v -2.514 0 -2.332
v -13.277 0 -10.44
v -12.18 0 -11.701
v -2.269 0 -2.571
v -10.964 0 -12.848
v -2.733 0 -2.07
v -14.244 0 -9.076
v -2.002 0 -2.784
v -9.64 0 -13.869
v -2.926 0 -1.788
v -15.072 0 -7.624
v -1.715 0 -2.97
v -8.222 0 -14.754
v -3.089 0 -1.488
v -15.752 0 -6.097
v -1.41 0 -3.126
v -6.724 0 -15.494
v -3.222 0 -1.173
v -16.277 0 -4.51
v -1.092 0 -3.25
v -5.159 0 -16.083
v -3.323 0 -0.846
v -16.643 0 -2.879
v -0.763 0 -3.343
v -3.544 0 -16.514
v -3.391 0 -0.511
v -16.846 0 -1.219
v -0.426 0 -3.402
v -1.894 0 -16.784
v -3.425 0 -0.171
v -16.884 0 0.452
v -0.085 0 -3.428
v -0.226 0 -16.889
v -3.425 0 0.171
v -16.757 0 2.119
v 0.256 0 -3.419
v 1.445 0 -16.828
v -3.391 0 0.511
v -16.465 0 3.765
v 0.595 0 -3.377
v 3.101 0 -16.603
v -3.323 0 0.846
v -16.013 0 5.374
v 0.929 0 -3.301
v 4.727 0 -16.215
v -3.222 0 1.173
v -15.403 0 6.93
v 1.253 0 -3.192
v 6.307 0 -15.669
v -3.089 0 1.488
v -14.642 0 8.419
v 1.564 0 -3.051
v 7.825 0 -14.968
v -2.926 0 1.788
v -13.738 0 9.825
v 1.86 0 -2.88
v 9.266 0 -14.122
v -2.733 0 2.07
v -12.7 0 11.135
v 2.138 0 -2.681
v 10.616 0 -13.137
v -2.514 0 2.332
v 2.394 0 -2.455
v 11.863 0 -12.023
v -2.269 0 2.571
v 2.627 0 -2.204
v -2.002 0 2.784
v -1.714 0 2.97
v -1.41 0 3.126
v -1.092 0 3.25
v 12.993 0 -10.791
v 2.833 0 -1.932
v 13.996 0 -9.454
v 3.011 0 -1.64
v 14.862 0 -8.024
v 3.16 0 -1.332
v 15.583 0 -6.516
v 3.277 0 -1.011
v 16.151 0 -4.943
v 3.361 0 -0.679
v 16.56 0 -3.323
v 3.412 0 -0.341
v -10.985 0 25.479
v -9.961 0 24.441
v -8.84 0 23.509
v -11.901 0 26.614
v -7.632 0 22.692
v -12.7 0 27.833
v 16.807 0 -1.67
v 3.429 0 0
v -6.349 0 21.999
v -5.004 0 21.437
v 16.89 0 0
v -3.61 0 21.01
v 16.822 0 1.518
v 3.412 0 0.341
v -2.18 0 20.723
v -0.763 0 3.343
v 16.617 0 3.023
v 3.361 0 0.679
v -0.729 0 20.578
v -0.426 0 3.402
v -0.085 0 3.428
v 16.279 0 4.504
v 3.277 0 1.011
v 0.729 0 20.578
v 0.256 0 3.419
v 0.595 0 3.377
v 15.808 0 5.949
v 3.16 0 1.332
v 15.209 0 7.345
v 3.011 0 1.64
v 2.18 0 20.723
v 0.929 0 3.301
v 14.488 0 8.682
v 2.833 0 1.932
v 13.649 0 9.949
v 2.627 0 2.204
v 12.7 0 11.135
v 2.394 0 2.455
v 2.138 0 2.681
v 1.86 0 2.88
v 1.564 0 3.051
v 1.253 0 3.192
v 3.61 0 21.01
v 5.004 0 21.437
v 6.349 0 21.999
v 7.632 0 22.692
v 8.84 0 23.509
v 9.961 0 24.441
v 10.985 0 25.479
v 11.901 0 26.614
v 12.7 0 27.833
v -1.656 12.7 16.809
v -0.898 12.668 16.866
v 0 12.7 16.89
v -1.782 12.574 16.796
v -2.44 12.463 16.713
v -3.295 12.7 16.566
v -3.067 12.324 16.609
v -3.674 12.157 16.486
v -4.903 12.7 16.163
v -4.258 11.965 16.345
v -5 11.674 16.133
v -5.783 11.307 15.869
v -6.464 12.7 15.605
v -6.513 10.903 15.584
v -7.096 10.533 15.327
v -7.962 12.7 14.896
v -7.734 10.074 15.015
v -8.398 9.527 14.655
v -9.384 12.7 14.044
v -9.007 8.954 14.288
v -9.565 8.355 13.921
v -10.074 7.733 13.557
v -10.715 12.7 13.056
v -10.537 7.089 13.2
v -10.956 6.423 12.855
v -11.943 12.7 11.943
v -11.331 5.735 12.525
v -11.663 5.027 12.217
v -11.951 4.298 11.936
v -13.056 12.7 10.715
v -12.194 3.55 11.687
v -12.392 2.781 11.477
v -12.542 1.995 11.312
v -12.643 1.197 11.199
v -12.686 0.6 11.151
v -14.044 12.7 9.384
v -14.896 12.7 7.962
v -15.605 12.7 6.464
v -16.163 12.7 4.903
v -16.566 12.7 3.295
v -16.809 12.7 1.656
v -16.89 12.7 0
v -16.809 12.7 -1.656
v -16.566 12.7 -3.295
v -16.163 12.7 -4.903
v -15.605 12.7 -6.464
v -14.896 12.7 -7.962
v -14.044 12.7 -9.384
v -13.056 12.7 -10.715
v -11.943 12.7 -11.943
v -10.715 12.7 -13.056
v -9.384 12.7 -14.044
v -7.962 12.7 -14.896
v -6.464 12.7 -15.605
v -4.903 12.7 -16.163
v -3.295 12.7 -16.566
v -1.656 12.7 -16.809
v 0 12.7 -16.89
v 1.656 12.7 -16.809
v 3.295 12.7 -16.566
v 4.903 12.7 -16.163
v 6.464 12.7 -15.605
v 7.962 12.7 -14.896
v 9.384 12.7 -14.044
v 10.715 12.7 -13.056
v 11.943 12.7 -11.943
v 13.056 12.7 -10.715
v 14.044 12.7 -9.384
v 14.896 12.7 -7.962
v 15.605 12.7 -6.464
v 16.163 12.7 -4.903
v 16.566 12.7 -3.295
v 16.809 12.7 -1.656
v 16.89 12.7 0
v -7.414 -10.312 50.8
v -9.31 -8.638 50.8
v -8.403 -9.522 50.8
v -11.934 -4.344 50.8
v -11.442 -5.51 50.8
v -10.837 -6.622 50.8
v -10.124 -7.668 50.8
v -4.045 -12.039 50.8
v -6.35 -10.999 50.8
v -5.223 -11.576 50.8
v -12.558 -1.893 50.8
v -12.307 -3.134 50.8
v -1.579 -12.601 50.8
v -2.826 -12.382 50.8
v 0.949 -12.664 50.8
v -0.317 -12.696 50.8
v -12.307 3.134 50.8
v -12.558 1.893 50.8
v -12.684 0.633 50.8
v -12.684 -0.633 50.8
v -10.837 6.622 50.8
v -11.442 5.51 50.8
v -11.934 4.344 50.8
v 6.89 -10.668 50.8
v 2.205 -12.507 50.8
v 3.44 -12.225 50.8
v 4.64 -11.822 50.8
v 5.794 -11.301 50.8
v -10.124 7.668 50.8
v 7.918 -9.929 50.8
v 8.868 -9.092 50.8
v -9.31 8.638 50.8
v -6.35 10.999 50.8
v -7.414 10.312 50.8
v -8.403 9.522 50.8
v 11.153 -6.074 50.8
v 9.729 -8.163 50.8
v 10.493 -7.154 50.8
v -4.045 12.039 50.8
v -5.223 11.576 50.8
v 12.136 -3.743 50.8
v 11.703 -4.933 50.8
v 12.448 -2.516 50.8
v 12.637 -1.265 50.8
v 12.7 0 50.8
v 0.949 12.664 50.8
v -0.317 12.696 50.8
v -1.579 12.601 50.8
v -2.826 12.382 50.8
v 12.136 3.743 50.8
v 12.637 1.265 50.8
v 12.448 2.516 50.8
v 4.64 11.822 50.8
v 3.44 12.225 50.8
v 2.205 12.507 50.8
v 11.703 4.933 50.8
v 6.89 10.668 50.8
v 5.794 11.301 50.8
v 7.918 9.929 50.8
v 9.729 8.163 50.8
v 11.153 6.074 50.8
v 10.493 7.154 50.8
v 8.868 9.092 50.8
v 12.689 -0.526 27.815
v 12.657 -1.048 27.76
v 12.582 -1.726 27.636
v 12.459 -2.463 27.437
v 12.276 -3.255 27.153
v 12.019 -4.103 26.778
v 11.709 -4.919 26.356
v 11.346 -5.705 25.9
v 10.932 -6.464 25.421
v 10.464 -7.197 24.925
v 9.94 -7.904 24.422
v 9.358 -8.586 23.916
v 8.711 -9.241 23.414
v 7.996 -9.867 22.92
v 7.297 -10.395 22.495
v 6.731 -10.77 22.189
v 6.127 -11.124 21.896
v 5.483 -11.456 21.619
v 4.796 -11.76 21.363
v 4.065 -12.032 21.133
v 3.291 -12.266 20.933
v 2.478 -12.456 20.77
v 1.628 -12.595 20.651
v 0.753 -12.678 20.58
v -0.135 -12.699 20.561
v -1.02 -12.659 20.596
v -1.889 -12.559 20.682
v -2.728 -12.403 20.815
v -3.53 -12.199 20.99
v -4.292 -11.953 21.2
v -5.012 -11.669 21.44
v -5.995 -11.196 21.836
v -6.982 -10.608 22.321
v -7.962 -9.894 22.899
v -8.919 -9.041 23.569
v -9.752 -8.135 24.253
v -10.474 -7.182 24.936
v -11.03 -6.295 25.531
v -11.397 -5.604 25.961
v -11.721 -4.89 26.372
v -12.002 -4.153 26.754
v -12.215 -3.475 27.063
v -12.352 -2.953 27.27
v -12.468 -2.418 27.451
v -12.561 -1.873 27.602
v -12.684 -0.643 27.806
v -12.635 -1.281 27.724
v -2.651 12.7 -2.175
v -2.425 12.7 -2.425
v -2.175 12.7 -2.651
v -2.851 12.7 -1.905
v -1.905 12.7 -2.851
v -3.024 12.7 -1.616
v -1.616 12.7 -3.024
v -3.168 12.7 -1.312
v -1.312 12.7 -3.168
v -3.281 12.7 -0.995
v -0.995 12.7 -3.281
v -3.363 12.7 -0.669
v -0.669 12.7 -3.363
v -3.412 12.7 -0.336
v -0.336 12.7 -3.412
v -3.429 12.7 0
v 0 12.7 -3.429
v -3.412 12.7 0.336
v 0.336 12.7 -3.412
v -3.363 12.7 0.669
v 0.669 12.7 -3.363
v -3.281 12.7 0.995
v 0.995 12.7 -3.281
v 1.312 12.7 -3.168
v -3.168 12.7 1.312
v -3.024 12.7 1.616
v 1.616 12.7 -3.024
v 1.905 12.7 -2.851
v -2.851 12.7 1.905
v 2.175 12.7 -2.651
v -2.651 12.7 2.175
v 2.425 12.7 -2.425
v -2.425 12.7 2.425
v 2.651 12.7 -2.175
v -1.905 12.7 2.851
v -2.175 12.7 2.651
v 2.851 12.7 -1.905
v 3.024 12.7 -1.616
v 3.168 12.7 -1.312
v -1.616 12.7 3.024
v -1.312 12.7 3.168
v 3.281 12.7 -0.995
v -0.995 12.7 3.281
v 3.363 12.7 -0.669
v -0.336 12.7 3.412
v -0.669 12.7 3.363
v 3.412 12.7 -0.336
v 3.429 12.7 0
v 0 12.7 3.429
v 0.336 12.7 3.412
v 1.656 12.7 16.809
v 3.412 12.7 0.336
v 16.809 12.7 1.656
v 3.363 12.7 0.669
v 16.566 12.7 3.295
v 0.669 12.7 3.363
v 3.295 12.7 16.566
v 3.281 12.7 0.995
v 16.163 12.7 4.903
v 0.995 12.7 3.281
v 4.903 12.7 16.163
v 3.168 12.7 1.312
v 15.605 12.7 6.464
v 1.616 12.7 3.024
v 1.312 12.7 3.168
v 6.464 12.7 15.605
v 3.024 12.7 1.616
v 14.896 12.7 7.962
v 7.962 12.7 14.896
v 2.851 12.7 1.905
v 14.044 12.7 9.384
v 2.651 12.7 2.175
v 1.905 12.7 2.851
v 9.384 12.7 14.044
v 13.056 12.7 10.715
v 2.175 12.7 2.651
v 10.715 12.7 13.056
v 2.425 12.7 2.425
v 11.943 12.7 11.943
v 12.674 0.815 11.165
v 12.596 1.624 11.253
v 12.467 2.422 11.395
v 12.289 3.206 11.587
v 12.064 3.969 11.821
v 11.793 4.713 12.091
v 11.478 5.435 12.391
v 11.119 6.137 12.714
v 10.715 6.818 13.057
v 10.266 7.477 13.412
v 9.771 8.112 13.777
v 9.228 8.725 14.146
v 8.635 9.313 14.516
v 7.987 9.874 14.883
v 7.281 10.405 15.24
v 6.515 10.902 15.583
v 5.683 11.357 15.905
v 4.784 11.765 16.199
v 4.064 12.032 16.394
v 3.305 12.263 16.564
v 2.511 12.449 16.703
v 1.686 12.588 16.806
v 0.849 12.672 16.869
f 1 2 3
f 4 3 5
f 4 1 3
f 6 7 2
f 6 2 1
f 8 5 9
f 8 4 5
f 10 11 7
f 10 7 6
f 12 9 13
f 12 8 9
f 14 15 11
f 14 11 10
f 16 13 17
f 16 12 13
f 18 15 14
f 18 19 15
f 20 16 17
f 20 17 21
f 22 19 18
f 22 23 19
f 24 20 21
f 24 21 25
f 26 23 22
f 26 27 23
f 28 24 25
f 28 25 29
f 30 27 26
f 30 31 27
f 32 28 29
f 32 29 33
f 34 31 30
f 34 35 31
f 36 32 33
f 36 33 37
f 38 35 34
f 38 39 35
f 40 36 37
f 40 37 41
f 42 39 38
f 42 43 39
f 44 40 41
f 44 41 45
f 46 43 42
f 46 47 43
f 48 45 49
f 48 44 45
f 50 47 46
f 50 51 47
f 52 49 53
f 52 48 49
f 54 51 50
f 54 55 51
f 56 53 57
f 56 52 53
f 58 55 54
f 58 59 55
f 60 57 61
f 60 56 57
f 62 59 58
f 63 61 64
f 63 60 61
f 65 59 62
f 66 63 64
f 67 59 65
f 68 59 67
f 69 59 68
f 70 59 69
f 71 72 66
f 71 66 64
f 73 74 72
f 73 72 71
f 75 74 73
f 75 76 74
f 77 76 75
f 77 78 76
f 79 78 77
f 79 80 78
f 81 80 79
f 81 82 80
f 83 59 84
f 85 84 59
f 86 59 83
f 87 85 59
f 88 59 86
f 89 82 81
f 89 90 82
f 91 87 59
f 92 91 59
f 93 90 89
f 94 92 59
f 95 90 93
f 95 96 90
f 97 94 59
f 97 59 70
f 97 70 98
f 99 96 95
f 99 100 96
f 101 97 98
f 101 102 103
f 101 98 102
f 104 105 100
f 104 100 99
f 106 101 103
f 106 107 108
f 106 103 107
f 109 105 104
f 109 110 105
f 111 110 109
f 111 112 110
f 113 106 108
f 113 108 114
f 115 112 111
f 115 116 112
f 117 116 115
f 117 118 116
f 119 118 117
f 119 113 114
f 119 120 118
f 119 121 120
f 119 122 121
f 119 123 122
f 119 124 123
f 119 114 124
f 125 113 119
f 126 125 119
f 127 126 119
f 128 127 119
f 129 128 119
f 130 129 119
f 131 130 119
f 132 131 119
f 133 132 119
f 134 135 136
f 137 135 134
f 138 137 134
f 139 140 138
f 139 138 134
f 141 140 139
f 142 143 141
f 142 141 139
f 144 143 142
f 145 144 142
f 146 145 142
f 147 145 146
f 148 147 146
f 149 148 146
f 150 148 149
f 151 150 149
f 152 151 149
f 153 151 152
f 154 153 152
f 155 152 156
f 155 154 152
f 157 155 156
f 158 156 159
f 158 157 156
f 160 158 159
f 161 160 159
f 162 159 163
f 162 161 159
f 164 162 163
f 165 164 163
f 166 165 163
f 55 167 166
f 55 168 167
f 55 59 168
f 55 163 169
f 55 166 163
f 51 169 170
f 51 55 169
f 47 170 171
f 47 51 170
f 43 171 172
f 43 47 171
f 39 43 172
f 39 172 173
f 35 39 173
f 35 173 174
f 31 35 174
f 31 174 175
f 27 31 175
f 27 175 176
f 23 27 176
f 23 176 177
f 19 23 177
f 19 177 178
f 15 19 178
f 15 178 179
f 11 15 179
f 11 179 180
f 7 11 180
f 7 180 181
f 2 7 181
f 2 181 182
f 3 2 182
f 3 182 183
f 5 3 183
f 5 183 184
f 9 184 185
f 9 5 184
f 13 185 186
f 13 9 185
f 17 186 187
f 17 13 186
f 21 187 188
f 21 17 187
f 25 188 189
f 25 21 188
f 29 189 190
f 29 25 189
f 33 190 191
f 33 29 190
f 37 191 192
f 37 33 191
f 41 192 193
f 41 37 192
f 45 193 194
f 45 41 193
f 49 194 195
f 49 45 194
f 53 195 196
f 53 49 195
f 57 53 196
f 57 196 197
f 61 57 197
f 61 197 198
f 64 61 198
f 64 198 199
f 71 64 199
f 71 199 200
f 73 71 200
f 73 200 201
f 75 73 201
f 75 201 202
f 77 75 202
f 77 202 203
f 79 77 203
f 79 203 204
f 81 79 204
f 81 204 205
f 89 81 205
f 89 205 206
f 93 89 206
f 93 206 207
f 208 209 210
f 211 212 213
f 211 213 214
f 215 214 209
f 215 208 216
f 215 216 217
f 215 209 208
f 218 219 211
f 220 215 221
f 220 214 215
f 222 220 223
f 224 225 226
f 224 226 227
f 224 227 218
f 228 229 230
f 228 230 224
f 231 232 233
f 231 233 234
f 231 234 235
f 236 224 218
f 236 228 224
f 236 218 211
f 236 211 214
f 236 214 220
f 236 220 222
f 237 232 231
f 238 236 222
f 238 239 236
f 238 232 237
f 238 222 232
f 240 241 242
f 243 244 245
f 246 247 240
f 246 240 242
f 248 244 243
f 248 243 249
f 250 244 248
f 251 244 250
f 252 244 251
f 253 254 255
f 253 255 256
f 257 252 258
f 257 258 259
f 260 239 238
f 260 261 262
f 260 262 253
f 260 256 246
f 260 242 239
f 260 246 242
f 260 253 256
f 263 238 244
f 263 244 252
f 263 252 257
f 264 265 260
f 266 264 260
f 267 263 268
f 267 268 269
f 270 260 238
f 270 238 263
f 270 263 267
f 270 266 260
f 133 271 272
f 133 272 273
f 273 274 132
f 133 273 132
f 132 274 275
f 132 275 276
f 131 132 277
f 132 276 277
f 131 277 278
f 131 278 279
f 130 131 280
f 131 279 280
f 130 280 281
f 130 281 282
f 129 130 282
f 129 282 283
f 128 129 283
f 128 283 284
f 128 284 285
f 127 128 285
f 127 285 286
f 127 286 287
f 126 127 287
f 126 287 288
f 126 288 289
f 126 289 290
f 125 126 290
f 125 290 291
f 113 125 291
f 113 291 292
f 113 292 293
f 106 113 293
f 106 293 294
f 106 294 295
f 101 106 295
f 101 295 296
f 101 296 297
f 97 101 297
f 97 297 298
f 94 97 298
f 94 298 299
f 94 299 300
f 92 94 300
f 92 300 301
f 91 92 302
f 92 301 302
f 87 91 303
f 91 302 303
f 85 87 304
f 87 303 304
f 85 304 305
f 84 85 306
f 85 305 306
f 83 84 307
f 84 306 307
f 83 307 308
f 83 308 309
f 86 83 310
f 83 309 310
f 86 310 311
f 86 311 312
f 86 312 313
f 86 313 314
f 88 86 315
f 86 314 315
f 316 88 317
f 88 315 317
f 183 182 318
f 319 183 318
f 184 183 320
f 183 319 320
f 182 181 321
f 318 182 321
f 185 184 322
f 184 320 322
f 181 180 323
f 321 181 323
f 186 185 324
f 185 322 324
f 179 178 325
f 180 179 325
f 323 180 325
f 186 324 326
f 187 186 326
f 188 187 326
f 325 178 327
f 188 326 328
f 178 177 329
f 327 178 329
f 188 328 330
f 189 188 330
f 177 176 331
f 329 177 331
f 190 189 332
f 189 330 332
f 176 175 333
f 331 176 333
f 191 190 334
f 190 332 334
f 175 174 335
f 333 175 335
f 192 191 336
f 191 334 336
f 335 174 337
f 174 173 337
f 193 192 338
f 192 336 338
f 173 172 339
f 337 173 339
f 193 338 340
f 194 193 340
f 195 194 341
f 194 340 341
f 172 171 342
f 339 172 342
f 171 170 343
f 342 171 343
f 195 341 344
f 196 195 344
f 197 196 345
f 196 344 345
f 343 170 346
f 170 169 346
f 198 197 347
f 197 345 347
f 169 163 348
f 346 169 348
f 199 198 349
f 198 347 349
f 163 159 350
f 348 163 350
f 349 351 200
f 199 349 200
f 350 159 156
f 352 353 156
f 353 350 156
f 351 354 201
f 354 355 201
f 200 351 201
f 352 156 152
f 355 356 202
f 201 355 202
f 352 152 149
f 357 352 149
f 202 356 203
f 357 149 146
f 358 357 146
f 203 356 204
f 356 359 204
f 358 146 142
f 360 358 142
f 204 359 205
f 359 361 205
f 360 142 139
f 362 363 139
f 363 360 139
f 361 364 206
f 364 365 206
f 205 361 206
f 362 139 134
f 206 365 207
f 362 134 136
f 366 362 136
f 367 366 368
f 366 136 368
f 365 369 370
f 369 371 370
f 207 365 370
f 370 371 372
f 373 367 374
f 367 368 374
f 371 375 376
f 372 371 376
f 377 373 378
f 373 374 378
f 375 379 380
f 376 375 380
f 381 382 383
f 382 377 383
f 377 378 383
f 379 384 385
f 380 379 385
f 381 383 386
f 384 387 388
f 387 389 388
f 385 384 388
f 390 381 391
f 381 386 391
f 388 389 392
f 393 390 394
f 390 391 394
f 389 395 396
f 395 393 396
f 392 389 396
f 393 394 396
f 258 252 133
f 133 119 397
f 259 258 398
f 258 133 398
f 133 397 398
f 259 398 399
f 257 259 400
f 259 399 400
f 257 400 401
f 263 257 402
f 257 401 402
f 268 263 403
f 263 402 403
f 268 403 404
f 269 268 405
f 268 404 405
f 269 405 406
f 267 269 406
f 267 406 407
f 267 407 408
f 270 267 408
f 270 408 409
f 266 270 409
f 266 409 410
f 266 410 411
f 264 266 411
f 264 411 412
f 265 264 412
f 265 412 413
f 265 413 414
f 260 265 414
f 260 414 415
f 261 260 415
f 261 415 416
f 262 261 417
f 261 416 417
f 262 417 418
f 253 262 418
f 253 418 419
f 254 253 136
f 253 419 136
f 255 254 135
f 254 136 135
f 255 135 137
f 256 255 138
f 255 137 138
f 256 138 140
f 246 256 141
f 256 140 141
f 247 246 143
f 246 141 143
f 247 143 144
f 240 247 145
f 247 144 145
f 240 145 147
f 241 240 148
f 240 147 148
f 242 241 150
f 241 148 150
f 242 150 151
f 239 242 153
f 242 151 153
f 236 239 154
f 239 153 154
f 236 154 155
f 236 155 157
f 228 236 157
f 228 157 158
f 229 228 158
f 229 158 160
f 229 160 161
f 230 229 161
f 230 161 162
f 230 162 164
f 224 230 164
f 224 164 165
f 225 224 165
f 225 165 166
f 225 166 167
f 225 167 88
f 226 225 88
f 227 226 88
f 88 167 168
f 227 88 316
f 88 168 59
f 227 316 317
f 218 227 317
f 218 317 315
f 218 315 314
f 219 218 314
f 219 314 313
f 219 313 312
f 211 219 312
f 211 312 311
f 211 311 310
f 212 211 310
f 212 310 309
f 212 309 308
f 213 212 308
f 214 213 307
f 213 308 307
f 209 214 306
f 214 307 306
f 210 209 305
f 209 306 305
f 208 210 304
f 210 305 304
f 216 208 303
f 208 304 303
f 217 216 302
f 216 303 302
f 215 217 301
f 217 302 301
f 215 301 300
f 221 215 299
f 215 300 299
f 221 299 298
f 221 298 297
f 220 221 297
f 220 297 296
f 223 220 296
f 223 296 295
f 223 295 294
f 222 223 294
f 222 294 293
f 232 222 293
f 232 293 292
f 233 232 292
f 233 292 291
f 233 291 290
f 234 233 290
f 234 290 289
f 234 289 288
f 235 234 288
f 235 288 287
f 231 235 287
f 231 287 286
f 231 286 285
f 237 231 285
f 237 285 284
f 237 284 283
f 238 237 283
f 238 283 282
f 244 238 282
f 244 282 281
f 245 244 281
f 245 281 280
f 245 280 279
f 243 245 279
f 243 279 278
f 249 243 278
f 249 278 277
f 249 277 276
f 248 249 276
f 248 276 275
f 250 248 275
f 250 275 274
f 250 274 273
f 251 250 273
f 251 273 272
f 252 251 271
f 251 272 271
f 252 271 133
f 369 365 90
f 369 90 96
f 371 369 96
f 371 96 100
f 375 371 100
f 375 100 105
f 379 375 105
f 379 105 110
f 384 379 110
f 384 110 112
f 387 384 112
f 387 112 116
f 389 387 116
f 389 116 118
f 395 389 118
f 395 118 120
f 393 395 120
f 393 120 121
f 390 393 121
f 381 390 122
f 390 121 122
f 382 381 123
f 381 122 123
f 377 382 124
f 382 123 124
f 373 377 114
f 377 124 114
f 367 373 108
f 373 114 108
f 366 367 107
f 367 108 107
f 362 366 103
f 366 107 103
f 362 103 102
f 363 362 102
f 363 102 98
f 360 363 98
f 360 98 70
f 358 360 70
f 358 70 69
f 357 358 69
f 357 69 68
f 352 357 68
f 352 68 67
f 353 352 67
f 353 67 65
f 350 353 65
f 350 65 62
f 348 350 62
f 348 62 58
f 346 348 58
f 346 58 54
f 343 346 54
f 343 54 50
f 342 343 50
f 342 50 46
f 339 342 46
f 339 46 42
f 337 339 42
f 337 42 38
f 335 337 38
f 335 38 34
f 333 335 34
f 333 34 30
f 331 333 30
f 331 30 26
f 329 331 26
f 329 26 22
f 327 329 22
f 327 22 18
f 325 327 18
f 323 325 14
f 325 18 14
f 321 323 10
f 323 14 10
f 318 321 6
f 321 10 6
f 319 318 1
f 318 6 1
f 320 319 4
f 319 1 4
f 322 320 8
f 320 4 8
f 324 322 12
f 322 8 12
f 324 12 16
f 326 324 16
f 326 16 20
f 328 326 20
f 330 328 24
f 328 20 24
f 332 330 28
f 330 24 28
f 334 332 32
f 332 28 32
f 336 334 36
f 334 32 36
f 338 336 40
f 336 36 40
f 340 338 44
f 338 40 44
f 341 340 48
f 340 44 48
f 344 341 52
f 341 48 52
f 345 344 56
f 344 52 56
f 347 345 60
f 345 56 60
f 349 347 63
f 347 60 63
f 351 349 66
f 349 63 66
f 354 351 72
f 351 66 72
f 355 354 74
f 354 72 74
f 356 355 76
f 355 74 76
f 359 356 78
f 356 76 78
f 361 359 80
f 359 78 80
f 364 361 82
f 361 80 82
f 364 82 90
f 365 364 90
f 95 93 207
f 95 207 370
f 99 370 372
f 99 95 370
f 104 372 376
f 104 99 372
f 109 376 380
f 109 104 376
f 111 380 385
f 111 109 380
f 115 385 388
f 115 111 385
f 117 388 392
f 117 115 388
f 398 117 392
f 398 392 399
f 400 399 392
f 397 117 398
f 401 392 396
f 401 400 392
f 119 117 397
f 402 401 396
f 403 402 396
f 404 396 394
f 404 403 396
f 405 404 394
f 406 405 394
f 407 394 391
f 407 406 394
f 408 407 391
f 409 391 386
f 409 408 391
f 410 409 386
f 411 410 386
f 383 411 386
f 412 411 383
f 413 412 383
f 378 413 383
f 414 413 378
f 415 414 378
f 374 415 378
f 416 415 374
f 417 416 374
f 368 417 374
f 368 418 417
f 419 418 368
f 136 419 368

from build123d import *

# Parameters (mm, degrees)
F0_R      = 16.890202
F1_DEPTH  = 12.7
F2_R      = 12.7
F3_DEPTH  = 50.8
F5_R      = 16.890202
F6_DEPTH  = 12.7
F7_R      = 3.429
F8_DEPTH  = 12.701
F10_DEPTH = 12.7


with BuildPart() as f1:
    # F0 (on Front) → F1 (new body, symmetric)
    with BuildSketch(Plane.XZ):
        Circle(F0_R)
    extrude(amount=F1_DEPTH, both=True)

    # F2 (on Top) → F3 (join)
    with BuildSketch(Plane.XY):
        Circle(F2_R)
    extrude(amount=F3_DEPTH)

    # F5 (on offset) → F6 (cut)
    with BuildSketch(Plane.XZ.offset(12.7)):
        Circle(F5_R)
    extrude(amount=-F6_DEPTH, mode=Mode.SUBTRACT)

    # F7 (on face) → F8 (cut, through all)
    with BuildSketch(Plane.XZ):
        Circle(F7_R)
    extrude(amount=-F8_DEPTH, mode=Mode.SUBTRACT)

    # F9 (on offset) → F10 (cut, through all)
    with BuildSketch(Plane.XZ.offset(12.7)):
        with BuildLine():
            ThreePointArc((13.434605, 29.257544), (0, 20.560373), (-13.434605, 29.257544))
            Line((-13.434605, 29.257544), (-13.434605, 6.106135))
            Line((-13.434605, 6.106135), (13.446192, 6.106135))
            Line((13.446192, 6.106135), (13.446192, 29.257544))
            Line((13.446192, 29.257544), (13.434605, 29.257544))
        make_face()
    extrude(amount=-F10_DEPTH, mode=Mode.SUBTRACT)


solid = f1.part
